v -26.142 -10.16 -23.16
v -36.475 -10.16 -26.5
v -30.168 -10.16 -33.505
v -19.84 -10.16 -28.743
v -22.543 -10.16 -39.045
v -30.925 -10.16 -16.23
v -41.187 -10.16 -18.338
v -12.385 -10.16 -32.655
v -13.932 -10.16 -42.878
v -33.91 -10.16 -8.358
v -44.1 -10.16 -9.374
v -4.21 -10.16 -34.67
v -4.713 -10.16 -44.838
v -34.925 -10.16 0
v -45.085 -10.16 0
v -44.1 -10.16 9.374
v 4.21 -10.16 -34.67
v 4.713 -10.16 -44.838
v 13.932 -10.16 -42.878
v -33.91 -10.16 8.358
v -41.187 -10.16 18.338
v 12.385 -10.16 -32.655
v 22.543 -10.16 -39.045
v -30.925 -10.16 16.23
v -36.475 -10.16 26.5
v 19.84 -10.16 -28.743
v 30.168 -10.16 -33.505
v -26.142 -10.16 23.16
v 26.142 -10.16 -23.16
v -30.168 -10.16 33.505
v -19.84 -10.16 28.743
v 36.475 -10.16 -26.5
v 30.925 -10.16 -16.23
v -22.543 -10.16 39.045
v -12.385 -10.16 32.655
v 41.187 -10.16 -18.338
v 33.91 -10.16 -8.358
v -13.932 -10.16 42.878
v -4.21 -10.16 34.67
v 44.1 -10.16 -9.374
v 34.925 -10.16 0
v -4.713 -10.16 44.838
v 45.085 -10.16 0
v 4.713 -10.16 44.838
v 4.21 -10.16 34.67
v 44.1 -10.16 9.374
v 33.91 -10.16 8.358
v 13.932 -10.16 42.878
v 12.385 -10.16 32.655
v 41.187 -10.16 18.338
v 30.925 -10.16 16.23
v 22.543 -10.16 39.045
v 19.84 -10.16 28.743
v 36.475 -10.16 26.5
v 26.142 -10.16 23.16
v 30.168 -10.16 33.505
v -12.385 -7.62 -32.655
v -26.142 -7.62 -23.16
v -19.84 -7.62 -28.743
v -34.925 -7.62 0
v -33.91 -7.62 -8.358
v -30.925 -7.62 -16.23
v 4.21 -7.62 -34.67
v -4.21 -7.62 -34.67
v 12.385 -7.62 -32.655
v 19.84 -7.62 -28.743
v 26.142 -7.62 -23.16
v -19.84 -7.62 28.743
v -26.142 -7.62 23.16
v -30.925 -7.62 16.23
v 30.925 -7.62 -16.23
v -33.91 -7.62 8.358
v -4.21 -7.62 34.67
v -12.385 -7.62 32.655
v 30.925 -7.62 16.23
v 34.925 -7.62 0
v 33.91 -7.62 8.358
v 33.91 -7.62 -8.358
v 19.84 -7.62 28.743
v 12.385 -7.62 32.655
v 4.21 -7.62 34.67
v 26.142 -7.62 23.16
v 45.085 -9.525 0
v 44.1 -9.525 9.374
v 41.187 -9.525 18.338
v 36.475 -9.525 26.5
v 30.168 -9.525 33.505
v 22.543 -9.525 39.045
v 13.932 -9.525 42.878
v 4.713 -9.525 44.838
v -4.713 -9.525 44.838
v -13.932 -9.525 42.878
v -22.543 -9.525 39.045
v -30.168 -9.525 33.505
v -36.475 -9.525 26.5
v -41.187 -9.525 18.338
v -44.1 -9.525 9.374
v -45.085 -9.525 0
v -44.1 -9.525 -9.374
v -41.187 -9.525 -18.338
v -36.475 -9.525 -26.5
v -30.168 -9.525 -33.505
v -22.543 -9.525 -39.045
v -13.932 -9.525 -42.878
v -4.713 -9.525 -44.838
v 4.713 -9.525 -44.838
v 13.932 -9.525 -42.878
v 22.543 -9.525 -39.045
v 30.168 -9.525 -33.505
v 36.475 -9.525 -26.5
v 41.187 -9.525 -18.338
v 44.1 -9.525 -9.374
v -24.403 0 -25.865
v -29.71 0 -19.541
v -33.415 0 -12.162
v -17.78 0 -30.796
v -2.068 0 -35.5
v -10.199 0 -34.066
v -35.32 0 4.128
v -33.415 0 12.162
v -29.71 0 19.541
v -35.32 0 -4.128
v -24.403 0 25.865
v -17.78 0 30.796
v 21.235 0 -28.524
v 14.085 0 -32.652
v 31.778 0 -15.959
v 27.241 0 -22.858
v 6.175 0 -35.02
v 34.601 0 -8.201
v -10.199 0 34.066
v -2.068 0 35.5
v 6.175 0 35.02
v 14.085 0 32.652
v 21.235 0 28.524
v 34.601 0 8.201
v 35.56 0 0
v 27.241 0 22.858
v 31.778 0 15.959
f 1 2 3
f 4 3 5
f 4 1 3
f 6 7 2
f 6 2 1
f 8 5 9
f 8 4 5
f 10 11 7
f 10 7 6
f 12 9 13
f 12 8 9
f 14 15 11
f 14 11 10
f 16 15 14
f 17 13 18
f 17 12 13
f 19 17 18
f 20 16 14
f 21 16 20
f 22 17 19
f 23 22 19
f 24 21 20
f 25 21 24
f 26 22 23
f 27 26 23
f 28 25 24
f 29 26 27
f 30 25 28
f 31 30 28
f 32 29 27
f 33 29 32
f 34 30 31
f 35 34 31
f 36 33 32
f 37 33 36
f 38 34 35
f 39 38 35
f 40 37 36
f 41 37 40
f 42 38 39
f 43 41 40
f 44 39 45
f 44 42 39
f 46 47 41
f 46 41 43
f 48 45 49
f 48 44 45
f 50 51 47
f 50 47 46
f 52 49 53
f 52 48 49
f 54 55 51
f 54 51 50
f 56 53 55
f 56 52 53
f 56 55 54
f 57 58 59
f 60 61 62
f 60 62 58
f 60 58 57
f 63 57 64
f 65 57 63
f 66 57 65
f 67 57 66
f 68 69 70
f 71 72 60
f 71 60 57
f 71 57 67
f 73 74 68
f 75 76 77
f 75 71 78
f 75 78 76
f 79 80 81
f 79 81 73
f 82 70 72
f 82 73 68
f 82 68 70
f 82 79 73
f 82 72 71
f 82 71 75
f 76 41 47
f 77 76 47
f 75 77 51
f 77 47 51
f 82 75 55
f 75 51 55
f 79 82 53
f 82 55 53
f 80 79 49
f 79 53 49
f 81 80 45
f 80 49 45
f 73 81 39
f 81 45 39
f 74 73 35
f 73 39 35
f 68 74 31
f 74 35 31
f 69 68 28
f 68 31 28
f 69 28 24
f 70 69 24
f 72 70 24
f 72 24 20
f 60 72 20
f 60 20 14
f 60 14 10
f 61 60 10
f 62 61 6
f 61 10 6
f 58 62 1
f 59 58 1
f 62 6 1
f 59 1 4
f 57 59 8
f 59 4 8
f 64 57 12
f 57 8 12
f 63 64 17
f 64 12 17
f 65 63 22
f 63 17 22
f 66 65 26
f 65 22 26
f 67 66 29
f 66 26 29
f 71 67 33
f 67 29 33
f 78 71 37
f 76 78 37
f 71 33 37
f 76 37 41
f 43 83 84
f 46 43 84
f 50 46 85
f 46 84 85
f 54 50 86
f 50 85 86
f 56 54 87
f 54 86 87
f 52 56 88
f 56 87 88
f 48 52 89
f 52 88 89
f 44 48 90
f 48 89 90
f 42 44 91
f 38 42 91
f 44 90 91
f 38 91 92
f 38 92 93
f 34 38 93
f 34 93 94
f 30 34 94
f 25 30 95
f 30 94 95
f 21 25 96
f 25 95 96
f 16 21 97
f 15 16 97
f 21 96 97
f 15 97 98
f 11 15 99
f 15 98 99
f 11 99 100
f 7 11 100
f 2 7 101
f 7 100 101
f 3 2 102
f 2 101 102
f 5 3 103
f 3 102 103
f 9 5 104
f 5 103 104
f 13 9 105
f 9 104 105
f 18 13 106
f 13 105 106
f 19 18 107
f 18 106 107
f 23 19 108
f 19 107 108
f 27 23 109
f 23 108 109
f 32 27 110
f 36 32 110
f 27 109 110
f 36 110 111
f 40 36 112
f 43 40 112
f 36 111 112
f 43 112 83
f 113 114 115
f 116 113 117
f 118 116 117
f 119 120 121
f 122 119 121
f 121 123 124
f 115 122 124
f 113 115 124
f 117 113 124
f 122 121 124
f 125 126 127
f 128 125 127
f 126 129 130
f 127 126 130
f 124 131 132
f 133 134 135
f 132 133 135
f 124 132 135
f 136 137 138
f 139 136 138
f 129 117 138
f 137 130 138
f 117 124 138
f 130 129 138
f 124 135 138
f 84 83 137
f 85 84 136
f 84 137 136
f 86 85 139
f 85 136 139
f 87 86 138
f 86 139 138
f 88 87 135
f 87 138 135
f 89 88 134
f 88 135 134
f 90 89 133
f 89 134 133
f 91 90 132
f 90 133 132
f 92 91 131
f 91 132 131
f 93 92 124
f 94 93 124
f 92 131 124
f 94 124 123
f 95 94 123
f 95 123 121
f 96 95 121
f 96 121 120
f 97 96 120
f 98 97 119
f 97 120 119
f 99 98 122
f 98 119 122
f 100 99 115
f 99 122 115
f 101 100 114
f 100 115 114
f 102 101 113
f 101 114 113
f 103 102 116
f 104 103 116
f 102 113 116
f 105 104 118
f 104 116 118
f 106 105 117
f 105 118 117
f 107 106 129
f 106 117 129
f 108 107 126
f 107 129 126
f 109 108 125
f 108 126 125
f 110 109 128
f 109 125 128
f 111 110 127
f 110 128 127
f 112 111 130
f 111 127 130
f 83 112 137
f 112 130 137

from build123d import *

# Parameters (mm, degrees)
F0_R     = 45.085
F1_DEPTH = 10.16
F2_R     = 34.925
F3_DEPTH = 2.54
F4_SIZE  = 9.525


with BuildPart() as f1:
    # F0 (on Front) → F1 (new body)
    with BuildSketch(Plane.XZ):
        Circle(F0_R)
    extrude(amount=F1_DEPTH)

    # F2 (on face) → F3 (cut)
    with BuildSketch(Plane.XZ.offset(10.16)):
        Circle(F2_R)
    extrude(amount=-F3_DEPTH, mode=Mode.SUBTRACT)

    # F4
    f4_edges = [f1.edges().sort_by_distance(p)[0] for p in [
        (-45.085, 0, 0),
    ]]
    chamfer(f4_edges, length=F4_SIZE)


solid = f1.part
